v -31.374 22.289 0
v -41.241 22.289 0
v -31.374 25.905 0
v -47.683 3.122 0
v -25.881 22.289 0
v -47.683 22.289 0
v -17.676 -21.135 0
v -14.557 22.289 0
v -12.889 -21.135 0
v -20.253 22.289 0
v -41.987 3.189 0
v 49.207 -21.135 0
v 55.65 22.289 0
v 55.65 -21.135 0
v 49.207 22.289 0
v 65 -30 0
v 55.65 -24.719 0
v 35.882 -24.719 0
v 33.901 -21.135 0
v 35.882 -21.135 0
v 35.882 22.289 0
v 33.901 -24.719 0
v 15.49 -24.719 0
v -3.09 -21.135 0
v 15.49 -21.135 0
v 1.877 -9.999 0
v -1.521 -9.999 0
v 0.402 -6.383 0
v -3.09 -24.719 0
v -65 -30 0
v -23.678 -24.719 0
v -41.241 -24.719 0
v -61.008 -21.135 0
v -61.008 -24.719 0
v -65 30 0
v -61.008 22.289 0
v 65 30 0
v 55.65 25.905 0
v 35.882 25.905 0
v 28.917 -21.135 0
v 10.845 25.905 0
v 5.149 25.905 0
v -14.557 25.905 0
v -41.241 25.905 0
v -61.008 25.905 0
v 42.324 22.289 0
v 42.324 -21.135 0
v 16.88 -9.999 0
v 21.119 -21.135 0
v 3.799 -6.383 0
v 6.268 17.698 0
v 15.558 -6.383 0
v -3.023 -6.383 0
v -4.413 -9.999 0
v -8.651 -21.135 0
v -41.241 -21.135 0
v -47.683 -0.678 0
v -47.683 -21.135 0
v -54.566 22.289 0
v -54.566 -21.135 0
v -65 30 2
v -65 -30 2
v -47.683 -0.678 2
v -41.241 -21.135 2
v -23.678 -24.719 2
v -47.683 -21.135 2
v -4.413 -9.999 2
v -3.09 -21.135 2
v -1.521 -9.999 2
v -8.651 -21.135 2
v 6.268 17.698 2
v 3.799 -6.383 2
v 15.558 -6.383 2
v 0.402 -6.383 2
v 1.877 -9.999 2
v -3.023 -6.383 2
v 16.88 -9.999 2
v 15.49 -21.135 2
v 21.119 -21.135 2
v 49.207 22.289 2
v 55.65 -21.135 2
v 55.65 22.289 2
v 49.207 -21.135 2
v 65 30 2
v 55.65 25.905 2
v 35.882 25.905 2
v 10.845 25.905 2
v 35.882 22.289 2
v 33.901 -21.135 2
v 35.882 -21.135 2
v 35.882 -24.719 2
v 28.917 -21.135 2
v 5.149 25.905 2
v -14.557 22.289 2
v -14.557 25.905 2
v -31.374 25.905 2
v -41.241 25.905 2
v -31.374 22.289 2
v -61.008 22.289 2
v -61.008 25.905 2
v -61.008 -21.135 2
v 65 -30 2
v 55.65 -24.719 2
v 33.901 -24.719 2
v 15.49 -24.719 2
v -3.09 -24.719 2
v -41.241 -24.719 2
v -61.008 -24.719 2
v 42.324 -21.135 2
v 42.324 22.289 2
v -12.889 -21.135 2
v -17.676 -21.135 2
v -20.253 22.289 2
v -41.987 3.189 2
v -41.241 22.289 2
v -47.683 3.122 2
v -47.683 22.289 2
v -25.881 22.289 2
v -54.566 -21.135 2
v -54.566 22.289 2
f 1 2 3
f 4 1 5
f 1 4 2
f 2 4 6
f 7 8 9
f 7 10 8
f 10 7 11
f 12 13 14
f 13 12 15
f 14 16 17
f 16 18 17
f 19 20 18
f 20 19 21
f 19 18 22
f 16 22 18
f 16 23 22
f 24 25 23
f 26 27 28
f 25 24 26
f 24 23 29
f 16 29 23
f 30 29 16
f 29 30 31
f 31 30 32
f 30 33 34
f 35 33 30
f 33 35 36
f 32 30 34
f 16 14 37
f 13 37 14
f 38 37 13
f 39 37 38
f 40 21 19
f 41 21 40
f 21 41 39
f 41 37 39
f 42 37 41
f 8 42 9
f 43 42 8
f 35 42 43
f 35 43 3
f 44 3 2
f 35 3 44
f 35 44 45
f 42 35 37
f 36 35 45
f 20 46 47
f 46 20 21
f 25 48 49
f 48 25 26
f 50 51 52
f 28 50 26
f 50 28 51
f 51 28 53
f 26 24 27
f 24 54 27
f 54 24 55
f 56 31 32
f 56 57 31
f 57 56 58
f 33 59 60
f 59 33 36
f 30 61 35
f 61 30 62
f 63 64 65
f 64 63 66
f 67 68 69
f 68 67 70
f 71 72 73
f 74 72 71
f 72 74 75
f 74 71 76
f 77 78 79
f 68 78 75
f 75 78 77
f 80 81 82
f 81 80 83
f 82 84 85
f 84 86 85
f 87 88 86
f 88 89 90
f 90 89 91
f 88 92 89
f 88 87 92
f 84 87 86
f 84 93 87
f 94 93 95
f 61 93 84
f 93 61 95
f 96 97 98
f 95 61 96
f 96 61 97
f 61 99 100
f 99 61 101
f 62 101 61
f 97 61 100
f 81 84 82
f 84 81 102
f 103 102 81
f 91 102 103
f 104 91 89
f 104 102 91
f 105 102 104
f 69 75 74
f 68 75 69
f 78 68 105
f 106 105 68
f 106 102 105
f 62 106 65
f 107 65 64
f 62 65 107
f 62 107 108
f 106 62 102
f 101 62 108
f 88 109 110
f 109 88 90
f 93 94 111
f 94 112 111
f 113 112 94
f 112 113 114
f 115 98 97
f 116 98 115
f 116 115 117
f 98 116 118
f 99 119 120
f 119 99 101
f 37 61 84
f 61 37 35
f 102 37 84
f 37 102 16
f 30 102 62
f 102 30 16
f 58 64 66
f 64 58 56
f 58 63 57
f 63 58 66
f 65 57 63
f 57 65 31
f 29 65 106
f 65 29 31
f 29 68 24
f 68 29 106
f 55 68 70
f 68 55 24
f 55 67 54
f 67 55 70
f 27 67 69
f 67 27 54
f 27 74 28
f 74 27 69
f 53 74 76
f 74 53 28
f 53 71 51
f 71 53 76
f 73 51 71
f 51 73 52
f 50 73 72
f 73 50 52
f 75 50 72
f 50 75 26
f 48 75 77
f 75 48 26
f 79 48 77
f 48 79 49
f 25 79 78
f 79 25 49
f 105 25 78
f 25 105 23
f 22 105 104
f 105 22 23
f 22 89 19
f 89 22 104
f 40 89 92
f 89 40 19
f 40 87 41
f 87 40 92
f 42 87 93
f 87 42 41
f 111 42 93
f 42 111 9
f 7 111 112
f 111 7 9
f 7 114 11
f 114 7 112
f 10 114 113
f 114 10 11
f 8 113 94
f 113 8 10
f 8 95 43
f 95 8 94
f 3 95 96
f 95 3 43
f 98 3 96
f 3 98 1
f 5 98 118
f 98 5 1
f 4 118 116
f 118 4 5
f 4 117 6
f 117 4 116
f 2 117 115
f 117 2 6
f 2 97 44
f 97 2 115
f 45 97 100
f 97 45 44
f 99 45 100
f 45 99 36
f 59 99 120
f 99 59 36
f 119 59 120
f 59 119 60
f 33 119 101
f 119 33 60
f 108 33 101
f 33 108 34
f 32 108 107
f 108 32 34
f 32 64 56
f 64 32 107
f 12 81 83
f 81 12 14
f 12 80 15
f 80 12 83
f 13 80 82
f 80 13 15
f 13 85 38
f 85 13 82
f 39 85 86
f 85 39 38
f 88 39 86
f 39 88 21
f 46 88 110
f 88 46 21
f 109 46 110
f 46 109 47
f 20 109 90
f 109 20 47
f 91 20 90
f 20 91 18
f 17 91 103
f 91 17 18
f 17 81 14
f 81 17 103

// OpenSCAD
name = "KAI";
font = "FreeSerif:style=Italic";
size = 50;
thickness = 2;


difference() {
    // Stencil sheet
    linear_extrude(thickness)
        square([130,60], center=true);

    // Subtract the text, but leave a bridge
    translate([-3,0,-1])
    linear_extrude(thickness + 2)
    difference() {
         //spaced_text(name, 40, size, font);
        text(name,
             size=size,
             font=font,
             halign="center",
             valign="center");

        // Bridge across the hole in the A
        rotate([0,0,-28])
        translate([7.5, -6])
            square([3, 12], center=true);
    }
}
